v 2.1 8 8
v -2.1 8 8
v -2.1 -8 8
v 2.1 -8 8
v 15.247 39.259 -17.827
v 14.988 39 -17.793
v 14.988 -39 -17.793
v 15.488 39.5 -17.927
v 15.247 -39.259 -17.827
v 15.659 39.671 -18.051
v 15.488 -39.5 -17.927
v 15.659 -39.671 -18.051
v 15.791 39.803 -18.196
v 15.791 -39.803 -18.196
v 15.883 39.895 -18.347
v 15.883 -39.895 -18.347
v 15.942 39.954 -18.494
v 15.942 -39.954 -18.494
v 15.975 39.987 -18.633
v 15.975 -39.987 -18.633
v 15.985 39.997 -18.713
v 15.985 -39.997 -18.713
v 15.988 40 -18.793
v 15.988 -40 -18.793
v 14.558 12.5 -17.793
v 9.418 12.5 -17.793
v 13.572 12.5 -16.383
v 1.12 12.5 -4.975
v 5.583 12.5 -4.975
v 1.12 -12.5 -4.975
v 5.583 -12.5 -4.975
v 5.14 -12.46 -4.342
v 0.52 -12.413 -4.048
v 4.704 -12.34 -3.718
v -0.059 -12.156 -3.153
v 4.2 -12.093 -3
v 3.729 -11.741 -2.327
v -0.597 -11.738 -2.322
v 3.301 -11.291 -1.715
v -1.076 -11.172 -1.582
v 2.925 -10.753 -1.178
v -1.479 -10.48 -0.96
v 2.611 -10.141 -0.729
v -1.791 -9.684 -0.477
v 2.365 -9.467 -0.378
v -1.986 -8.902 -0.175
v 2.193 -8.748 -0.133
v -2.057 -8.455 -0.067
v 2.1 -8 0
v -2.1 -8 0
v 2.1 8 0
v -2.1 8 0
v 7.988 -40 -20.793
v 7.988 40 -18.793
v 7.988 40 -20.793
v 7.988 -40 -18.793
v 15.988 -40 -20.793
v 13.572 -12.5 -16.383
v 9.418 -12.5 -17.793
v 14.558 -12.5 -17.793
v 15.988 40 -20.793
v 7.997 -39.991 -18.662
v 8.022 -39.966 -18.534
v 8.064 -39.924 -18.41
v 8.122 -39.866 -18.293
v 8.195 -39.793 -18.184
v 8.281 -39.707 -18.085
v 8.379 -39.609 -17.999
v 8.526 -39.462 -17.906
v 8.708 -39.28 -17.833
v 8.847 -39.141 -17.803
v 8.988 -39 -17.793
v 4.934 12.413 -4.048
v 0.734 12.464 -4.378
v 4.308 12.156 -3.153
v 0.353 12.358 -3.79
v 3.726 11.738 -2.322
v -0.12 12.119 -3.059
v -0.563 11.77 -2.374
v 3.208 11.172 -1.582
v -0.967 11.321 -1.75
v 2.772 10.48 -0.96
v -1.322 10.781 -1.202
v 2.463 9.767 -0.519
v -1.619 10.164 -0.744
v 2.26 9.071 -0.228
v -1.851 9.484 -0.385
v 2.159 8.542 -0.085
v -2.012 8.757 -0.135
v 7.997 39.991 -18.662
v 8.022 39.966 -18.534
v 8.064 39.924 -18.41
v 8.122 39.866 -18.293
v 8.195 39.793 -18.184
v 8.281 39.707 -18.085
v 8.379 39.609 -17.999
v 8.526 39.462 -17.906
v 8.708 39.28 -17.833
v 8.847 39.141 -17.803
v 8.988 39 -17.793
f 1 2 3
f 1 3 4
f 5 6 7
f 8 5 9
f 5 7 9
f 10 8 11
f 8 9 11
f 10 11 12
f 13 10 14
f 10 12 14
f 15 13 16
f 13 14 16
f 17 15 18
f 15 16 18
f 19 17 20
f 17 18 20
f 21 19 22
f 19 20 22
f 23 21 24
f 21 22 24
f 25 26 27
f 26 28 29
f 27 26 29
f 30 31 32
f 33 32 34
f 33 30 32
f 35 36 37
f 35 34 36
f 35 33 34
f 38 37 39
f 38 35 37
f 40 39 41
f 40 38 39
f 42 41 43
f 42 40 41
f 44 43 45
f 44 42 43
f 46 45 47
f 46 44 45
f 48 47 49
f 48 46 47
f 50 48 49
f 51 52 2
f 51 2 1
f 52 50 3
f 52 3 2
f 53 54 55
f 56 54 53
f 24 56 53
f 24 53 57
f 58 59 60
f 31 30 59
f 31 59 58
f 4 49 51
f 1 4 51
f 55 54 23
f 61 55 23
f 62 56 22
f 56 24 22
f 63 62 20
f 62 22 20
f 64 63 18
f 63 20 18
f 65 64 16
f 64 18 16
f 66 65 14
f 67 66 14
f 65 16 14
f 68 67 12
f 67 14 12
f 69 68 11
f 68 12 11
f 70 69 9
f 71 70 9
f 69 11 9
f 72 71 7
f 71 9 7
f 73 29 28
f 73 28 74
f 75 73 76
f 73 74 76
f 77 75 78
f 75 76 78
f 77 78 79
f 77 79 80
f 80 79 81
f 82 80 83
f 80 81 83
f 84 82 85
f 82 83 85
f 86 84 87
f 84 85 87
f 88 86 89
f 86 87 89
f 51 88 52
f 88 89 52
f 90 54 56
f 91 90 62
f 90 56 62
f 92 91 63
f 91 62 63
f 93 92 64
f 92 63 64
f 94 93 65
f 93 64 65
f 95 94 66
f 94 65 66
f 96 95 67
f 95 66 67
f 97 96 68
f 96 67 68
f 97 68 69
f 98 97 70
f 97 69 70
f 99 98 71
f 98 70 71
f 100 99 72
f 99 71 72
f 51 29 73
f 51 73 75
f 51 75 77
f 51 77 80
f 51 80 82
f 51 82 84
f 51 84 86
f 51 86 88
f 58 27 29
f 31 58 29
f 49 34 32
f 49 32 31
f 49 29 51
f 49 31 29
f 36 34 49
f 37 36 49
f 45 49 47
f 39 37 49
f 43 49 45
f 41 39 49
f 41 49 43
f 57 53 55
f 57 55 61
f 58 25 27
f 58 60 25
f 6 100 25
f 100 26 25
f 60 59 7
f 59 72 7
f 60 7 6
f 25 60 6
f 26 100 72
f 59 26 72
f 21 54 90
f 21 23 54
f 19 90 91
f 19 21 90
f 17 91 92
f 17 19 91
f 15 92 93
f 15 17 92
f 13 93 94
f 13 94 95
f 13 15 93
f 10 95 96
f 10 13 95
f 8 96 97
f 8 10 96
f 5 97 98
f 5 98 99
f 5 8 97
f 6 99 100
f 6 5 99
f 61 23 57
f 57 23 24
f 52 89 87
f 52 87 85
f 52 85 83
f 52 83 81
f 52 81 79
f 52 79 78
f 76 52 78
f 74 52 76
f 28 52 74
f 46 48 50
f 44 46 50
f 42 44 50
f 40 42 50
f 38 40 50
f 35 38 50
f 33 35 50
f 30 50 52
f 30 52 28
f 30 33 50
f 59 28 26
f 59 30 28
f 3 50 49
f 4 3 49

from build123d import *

# Parameters (mm, degrees)
F0_W        = 4.2
F0_H        = 16
F1_DEPTH    = 8
F4_DEPTH    = 12.5
F5_W        = 8
F5_H        = 80
F6_DEPTH    = 3
F7_R        = 1
F8_T1_DEPTH = 29.0746859277


# Not quite as in the source:
# - a fillet or chamfer that OpenCascade refuses, or shapes differently, is made with other operations: its cross-section is extruded or revolved along the edge and cut away or added


with BuildPart() as f1:
    # F0 (on Top) → F1 (new body)
    with BuildSketch(Plane.XY):
        Rectangle(F0_W, F0_H)
    extrude(amount=F1_DEPTH)

    # F3 (on face) → F4 (join, symmetric)
    with BuildSketch(Plane.XZ):
        Polygon((13.571528727, -16.3830408858), (2.1, 0), (-0.9, 0), (11.558498512, -17.792579817), align=None)
        Polygon((14.558498512, -17.792579817), (13.571528727, -16.3830408858), (11.558498512, -17.792579817), align=None)
        Polygon((11.558498512, -17.792579817), (-0.9, 0), (-2.1, 0), (9.4175692648, -17.792579817), align=None)
    extrude(amount=F4_DEPTH, both=True)

    # F5 (on face) → F6 (join)
    with BuildSketch(Plane(origin=(0, 0, -17.792579817), x_dir=(1, 0, 0), z_dir=(0, 0, -1))):
        with Locations((11.9880338884, 0)):
            Rectangle(F5_W, F5_H)
    extrude(amount=F6_DEPTH)

    # F7
    f7_edges = [f1.edges().sort_by_distance(p)[0] for p in [
        (15.988034, 0, -17.79258),
        (11.988034, 40, -17.79258),
        (7.988034, 0, -17.79258),
        (11.988034, -40, -17.79258),
    ]]
    fillet(f7_edges, radius=F7_R)

    # F8: fillet of radius 5 on 2 edges, made by hand

    # F8_s2 → F8_t1 (cut)
    with BuildSketch(Plane.YZ.offset(-14.5373429638)):
        with BuildLine():
            ThreePointArc((-12.5, -4.9749371855), (-11.2080992435, -1.6208352193), (-8, 0))
            Line((-8, 0), (-12.5, 0))
            Line((-12.5, 0), (-12.5, -4.9749371855))
        make_face()
        with BuildLine():
            ThreePointArc((12.5, -4.9749371855), (11.2080992435, -1.6208352193), (8, 0))
            Line((8, 0), (12.5, 0))
            Line((12.5, 0), (12.5, -4.9749371855))
        make_face()
    extrude(amount=F8_T1_DEPTH, mode=Mode.SUBTRACT)


solid = f1.part
